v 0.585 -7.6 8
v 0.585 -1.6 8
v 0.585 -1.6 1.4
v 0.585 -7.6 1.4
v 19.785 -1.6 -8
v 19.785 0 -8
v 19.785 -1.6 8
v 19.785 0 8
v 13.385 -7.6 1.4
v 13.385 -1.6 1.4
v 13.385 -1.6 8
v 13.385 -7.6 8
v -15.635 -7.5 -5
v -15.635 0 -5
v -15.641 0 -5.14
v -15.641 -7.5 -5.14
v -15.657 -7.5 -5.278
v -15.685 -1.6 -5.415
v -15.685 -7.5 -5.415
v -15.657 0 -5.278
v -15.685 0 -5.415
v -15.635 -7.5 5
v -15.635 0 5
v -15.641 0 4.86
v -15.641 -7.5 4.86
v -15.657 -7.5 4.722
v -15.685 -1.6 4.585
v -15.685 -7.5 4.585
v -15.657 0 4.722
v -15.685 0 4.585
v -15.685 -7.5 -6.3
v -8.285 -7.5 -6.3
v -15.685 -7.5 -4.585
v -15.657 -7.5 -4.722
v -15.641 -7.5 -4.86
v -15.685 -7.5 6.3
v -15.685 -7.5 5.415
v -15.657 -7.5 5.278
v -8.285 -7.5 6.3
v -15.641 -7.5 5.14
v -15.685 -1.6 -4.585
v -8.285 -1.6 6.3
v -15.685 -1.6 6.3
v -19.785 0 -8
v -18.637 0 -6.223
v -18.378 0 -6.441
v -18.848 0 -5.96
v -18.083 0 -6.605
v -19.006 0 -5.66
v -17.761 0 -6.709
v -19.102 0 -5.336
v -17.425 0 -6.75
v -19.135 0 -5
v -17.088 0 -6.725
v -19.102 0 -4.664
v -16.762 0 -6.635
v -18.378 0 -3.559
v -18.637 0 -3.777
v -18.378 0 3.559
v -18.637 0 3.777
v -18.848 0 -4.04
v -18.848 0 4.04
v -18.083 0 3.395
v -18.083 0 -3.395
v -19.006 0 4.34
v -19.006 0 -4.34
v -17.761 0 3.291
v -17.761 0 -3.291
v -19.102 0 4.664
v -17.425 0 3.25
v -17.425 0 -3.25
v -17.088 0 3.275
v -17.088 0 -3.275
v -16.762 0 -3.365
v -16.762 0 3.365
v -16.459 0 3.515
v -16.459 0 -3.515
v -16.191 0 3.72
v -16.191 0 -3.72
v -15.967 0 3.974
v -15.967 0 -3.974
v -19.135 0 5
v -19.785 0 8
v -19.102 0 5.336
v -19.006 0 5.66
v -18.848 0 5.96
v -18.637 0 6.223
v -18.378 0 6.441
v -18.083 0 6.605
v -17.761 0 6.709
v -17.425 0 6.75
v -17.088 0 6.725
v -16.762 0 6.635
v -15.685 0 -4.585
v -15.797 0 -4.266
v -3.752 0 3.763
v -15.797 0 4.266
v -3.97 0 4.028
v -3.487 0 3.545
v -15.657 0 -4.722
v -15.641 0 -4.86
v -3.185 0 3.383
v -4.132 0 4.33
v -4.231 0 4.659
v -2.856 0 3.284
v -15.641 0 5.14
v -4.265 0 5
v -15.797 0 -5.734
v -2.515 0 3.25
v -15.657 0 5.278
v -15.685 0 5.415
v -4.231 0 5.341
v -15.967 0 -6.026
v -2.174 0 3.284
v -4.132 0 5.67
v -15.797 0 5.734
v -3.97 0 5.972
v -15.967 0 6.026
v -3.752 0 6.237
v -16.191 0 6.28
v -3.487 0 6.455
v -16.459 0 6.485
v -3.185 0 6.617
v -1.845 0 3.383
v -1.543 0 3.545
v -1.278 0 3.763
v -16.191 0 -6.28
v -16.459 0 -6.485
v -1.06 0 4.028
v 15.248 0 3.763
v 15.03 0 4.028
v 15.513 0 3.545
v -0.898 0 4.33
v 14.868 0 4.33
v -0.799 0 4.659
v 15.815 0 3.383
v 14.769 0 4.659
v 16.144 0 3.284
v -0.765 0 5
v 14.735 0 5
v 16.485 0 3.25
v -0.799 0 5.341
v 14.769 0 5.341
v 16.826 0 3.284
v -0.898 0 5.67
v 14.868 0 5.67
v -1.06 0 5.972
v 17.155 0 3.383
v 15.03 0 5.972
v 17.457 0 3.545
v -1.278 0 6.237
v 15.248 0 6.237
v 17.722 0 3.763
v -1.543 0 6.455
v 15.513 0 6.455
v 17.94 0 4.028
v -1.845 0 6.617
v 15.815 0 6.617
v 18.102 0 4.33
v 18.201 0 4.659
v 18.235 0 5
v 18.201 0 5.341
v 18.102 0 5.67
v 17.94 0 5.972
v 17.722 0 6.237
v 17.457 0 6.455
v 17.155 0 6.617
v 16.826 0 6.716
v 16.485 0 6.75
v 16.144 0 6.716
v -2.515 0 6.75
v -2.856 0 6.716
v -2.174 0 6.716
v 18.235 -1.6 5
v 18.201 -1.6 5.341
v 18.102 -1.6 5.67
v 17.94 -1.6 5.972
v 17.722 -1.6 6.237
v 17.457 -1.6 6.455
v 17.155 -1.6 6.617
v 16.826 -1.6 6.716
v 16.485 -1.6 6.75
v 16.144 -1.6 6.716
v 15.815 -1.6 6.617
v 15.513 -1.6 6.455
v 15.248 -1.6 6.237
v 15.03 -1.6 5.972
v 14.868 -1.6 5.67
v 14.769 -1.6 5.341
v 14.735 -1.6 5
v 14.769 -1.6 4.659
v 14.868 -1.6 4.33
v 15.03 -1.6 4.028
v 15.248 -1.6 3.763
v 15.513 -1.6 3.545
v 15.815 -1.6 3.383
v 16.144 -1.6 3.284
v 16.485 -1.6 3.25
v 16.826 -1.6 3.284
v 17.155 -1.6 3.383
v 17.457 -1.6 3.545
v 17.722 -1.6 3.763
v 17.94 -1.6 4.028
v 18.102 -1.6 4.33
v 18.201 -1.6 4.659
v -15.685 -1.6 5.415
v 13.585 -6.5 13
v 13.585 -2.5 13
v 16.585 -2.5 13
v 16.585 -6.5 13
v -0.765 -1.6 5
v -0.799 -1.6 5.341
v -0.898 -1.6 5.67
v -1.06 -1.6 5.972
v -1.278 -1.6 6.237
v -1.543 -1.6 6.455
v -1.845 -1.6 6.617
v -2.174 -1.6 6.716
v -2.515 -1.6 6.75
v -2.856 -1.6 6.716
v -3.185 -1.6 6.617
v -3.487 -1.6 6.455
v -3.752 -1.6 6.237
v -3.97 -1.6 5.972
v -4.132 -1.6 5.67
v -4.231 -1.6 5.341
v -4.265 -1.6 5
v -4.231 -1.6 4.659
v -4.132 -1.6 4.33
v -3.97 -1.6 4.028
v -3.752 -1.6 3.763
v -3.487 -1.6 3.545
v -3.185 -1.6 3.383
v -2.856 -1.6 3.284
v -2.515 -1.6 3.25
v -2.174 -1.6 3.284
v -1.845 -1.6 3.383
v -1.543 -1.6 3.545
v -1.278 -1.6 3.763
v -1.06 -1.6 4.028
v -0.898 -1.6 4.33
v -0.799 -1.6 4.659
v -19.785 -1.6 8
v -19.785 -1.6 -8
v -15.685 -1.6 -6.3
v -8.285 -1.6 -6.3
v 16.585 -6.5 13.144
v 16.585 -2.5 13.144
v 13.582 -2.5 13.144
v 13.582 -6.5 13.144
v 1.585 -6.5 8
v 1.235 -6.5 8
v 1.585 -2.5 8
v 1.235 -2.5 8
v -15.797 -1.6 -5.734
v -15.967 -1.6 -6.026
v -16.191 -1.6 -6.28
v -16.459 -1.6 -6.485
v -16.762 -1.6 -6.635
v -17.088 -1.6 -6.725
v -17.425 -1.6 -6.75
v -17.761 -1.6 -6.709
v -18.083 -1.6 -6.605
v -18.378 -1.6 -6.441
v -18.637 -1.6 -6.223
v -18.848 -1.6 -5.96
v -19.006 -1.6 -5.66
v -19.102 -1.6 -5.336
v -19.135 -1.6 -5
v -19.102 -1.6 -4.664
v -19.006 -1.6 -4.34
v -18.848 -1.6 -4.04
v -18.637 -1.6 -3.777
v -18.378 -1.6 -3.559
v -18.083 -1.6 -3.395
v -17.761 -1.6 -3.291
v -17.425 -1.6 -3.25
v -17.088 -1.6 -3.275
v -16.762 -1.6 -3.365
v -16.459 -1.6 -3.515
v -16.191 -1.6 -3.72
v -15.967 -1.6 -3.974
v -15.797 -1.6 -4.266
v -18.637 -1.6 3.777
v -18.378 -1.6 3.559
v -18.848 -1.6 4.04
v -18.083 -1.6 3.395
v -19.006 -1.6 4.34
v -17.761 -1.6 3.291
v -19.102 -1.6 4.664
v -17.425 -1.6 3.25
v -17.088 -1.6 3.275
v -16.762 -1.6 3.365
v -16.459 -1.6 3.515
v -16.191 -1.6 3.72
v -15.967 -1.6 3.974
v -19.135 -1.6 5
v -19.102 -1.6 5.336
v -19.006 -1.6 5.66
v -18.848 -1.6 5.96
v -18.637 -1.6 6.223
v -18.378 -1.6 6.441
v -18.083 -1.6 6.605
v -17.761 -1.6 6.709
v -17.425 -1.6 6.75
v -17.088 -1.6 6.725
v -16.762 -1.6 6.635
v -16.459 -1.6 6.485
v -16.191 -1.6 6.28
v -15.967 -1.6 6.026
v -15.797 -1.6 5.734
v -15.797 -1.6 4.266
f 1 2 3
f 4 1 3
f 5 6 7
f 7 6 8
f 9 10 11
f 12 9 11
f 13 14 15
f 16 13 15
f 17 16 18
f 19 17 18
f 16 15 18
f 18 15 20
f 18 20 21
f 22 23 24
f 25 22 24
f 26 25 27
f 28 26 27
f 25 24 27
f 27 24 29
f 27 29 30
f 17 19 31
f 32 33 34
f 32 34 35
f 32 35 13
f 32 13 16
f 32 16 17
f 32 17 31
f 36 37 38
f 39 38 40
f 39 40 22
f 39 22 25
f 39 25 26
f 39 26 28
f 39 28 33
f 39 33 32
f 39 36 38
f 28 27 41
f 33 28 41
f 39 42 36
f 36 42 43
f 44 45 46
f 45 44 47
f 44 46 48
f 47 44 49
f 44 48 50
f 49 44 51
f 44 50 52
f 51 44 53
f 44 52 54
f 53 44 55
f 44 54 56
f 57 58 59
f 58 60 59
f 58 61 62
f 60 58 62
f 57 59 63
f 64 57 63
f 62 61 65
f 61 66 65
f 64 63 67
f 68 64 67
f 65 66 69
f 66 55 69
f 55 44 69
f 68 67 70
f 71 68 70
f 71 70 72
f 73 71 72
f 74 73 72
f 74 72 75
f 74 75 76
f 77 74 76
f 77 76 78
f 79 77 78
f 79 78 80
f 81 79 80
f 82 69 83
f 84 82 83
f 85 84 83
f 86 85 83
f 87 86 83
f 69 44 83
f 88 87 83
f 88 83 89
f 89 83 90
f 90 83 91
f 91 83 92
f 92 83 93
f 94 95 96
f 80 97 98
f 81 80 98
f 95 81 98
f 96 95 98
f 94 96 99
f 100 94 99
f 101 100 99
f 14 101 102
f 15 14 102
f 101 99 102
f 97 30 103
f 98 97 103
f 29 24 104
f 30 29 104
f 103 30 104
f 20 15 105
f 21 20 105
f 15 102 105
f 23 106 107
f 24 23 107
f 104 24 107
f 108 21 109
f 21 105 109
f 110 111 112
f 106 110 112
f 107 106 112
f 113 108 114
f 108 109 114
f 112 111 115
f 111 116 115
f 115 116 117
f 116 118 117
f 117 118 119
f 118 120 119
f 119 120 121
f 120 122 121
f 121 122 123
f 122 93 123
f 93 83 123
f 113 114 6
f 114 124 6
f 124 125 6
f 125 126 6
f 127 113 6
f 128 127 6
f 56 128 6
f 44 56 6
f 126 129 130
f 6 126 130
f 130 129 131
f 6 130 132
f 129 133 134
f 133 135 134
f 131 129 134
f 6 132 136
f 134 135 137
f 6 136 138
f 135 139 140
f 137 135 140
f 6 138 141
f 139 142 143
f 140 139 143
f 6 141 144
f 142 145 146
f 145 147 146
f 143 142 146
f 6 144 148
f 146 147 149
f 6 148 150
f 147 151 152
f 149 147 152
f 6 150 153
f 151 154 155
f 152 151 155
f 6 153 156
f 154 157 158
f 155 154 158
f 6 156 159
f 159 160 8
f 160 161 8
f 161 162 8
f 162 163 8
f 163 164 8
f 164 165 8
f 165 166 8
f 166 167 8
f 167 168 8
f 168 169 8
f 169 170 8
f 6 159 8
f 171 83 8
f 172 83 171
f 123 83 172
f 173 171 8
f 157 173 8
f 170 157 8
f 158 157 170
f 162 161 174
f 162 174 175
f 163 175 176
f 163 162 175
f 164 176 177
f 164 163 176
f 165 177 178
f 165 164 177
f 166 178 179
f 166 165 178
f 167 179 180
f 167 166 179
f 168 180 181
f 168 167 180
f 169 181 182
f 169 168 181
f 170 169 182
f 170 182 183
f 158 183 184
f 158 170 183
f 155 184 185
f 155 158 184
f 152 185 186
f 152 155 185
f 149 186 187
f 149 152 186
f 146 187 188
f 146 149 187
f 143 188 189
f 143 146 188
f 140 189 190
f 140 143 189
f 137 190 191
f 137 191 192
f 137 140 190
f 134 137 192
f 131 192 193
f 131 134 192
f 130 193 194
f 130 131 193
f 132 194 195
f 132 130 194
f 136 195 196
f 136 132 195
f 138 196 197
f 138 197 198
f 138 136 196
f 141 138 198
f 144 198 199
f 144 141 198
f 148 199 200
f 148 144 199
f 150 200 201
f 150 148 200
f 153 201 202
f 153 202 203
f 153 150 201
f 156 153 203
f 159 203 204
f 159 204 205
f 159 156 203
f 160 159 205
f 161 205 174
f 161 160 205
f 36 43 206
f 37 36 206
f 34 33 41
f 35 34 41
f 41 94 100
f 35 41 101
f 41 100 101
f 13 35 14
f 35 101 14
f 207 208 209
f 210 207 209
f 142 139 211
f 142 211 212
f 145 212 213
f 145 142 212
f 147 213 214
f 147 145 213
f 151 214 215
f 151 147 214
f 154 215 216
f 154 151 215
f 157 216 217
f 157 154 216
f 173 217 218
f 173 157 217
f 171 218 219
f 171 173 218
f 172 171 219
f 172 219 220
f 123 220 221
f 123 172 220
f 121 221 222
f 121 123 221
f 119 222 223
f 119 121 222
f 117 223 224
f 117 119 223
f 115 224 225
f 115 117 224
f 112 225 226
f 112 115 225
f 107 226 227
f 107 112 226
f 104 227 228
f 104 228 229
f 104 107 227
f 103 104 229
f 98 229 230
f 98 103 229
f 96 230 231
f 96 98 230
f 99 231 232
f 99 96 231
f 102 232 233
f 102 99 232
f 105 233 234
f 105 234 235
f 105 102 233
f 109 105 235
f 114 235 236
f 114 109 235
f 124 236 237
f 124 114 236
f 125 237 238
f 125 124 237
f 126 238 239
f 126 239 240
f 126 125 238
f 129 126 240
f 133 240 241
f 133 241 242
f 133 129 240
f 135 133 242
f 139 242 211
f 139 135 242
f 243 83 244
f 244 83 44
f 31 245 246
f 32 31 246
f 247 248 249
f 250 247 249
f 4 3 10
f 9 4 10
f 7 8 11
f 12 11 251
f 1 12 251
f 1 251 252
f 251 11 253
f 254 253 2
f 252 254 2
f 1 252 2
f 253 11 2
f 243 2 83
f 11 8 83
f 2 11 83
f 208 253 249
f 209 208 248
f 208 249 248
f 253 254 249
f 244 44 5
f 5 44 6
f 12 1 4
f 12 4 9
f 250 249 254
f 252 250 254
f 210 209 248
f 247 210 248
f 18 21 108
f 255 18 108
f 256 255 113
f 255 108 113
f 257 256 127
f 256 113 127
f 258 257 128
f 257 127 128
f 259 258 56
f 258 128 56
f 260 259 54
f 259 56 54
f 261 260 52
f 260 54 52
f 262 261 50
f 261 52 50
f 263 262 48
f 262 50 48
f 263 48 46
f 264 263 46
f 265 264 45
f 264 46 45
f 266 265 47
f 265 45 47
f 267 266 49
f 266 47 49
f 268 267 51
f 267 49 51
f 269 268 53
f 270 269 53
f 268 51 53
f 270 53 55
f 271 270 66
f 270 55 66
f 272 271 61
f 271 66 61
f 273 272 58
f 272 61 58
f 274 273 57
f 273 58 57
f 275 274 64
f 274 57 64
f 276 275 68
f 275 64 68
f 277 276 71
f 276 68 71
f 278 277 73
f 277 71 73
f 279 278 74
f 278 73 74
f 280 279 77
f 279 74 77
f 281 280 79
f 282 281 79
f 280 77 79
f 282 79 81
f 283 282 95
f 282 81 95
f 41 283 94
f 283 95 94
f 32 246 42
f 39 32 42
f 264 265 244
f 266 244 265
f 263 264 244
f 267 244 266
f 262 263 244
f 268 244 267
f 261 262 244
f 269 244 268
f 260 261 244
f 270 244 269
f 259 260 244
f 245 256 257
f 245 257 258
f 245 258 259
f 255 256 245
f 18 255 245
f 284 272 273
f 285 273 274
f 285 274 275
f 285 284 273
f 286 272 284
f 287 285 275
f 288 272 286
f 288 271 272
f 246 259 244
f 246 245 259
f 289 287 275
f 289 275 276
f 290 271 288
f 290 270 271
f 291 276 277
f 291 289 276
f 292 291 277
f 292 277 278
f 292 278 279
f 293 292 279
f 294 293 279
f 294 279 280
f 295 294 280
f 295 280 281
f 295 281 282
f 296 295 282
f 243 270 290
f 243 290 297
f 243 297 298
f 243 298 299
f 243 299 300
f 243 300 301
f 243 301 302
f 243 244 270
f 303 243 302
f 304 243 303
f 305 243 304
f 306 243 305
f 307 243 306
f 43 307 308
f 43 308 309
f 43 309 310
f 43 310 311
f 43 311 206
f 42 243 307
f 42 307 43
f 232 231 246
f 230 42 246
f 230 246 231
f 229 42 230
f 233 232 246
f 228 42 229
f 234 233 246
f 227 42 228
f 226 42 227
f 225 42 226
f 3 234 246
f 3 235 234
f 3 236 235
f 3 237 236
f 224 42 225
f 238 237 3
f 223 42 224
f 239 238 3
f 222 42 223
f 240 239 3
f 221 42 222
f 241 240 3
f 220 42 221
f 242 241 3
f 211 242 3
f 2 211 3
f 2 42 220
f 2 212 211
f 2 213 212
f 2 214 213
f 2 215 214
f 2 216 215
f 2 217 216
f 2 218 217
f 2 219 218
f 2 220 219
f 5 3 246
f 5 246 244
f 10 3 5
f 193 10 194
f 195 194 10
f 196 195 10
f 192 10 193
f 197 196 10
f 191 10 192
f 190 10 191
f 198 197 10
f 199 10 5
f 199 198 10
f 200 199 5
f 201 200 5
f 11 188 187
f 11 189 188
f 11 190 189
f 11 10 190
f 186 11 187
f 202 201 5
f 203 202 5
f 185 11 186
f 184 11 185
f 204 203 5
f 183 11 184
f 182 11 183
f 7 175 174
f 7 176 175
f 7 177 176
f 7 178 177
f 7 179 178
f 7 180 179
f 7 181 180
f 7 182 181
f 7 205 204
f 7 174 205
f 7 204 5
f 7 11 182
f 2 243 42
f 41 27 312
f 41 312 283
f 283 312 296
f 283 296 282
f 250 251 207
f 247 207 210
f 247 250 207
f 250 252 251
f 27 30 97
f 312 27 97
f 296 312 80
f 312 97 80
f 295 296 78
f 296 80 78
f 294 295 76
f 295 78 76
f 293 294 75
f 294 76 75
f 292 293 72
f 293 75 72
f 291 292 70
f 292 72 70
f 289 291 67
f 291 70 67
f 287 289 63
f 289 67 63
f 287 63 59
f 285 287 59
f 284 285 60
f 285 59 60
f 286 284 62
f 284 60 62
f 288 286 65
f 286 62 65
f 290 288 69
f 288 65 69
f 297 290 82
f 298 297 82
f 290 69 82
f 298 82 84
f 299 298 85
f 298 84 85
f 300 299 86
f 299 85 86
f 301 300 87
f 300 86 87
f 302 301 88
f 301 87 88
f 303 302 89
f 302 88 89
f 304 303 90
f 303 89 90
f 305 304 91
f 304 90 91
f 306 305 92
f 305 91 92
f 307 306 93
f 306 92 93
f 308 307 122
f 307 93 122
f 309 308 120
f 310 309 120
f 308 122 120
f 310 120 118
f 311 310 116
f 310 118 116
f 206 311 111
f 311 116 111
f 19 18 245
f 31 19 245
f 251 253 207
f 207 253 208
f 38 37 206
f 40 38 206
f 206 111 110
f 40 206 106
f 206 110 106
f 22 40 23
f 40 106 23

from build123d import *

# Parameters (mm, degrees)
F0_R     = 1.75
F1_DEPTH = 1.6
F2_DEPTH = 7.6
F3_DEPTH = 7.5
F4_START = 2.5
F4_DEPTH = 4


with BuildPart() as f1:
    # F0 (on Front) → F1 (new body)
    with BuildSketch(Plane.XZ):
        Polygon((19.785, -8), (19.785, 8), (13.385, 8), (13.385, 1.4), (0.585, 1.4), (0.585, 8), (-19.785, 8), (-19.785, -8), align=None)
        with BuildLine():
            ThreePointArc((-15.685, 4.5846688069), (-19.135, 5), (-15.685, 5.4153311931))
            Line((-15.685, 5.4153311931), (-15.685, 6.3))
            Line((-15.685, 6.3), (-8.285, 6.3))
            Line((-8.285, 6.3), (-8.285, -6.3))
            Line((-8.285, -6.3), (-15.685, -6.3))
            Line((-15.685, -6.3), (-15.685, -5.4153311931))
            ThreePointArc((-15.685, -5.4153311931), (-19.135, -5), (-15.685, -4.5846688069))
            Line((-15.685, -4.5846688069), (-15.685, 4.5846688069))
        make_face(mode=Mode.SUBTRACT)
        with Locations((-2.515, 5)):
            Circle(F0_R, mode=Mode.SUBTRACT)
        with Locations((16.485, 5)):
            Circle(F0_R, mode=Mode.SUBTRACT)
    extrude(amount=F1_DEPTH)

    # F0 (on Front) → F2 (join)
    with BuildSketch(Plane.XZ):
        Polygon((13.385, 1.4), (13.385, 8), (1.585, 8), (1.2352894992, 8), (0.585, 8), (0.585, 1.4), align=None)
    extrude(amount=F2_DEPTH)

    # F0 (on Front) → F3 (join)
    with BuildSketch(Plane.XZ):
        with BuildLine():
            ThreePointArc((-15.685, 5.4153311931), (-15.6475449646, 5.2091650066), (-15.635, 5))
            ThreePointArc((-15.635, 5), (-15.6475449646, 4.7908349934), (-15.685, 4.5846688069))
            Line((-15.685, 4.5846688069), (-15.685, -4.5846688069))
            ThreePointArc((-15.685, -4.5846688069), (-15.6475449646, -4.7908349934), (-15.635, -5))
            ThreePointArc((-15.635, -5), (-15.6475449646, -5.2091650066), (-15.685, -5.4153311931))
            Line((-15.685, -5.4153311931), (-15.685, -6.3))
            Line((-15.685, -6.3), (-8.285, -6.3))
            Line((-8.285, -6.3), (-8.285, 6.3))
            Line((-8.285, 6.3), (-15.685, 6.3))
            Line((-15.685, 6.3), (-15.685, 5.4153311931))
        make_face()
    extrude(amount=F3_DEPTH)

    # F0 (on Front) → F4 (join)
    with BuildSketch(Plane.XZ.offset(F4_START)):
        Polygon((1.2352894992, 8), (1.585, 8), (13.585, 13), (16.585, 13), (16.585, 13.1444329156), (13.5819284966, 13.1444329156), align=None)
    extrude(amount=F4_DEPTH)


solid = f1.part
